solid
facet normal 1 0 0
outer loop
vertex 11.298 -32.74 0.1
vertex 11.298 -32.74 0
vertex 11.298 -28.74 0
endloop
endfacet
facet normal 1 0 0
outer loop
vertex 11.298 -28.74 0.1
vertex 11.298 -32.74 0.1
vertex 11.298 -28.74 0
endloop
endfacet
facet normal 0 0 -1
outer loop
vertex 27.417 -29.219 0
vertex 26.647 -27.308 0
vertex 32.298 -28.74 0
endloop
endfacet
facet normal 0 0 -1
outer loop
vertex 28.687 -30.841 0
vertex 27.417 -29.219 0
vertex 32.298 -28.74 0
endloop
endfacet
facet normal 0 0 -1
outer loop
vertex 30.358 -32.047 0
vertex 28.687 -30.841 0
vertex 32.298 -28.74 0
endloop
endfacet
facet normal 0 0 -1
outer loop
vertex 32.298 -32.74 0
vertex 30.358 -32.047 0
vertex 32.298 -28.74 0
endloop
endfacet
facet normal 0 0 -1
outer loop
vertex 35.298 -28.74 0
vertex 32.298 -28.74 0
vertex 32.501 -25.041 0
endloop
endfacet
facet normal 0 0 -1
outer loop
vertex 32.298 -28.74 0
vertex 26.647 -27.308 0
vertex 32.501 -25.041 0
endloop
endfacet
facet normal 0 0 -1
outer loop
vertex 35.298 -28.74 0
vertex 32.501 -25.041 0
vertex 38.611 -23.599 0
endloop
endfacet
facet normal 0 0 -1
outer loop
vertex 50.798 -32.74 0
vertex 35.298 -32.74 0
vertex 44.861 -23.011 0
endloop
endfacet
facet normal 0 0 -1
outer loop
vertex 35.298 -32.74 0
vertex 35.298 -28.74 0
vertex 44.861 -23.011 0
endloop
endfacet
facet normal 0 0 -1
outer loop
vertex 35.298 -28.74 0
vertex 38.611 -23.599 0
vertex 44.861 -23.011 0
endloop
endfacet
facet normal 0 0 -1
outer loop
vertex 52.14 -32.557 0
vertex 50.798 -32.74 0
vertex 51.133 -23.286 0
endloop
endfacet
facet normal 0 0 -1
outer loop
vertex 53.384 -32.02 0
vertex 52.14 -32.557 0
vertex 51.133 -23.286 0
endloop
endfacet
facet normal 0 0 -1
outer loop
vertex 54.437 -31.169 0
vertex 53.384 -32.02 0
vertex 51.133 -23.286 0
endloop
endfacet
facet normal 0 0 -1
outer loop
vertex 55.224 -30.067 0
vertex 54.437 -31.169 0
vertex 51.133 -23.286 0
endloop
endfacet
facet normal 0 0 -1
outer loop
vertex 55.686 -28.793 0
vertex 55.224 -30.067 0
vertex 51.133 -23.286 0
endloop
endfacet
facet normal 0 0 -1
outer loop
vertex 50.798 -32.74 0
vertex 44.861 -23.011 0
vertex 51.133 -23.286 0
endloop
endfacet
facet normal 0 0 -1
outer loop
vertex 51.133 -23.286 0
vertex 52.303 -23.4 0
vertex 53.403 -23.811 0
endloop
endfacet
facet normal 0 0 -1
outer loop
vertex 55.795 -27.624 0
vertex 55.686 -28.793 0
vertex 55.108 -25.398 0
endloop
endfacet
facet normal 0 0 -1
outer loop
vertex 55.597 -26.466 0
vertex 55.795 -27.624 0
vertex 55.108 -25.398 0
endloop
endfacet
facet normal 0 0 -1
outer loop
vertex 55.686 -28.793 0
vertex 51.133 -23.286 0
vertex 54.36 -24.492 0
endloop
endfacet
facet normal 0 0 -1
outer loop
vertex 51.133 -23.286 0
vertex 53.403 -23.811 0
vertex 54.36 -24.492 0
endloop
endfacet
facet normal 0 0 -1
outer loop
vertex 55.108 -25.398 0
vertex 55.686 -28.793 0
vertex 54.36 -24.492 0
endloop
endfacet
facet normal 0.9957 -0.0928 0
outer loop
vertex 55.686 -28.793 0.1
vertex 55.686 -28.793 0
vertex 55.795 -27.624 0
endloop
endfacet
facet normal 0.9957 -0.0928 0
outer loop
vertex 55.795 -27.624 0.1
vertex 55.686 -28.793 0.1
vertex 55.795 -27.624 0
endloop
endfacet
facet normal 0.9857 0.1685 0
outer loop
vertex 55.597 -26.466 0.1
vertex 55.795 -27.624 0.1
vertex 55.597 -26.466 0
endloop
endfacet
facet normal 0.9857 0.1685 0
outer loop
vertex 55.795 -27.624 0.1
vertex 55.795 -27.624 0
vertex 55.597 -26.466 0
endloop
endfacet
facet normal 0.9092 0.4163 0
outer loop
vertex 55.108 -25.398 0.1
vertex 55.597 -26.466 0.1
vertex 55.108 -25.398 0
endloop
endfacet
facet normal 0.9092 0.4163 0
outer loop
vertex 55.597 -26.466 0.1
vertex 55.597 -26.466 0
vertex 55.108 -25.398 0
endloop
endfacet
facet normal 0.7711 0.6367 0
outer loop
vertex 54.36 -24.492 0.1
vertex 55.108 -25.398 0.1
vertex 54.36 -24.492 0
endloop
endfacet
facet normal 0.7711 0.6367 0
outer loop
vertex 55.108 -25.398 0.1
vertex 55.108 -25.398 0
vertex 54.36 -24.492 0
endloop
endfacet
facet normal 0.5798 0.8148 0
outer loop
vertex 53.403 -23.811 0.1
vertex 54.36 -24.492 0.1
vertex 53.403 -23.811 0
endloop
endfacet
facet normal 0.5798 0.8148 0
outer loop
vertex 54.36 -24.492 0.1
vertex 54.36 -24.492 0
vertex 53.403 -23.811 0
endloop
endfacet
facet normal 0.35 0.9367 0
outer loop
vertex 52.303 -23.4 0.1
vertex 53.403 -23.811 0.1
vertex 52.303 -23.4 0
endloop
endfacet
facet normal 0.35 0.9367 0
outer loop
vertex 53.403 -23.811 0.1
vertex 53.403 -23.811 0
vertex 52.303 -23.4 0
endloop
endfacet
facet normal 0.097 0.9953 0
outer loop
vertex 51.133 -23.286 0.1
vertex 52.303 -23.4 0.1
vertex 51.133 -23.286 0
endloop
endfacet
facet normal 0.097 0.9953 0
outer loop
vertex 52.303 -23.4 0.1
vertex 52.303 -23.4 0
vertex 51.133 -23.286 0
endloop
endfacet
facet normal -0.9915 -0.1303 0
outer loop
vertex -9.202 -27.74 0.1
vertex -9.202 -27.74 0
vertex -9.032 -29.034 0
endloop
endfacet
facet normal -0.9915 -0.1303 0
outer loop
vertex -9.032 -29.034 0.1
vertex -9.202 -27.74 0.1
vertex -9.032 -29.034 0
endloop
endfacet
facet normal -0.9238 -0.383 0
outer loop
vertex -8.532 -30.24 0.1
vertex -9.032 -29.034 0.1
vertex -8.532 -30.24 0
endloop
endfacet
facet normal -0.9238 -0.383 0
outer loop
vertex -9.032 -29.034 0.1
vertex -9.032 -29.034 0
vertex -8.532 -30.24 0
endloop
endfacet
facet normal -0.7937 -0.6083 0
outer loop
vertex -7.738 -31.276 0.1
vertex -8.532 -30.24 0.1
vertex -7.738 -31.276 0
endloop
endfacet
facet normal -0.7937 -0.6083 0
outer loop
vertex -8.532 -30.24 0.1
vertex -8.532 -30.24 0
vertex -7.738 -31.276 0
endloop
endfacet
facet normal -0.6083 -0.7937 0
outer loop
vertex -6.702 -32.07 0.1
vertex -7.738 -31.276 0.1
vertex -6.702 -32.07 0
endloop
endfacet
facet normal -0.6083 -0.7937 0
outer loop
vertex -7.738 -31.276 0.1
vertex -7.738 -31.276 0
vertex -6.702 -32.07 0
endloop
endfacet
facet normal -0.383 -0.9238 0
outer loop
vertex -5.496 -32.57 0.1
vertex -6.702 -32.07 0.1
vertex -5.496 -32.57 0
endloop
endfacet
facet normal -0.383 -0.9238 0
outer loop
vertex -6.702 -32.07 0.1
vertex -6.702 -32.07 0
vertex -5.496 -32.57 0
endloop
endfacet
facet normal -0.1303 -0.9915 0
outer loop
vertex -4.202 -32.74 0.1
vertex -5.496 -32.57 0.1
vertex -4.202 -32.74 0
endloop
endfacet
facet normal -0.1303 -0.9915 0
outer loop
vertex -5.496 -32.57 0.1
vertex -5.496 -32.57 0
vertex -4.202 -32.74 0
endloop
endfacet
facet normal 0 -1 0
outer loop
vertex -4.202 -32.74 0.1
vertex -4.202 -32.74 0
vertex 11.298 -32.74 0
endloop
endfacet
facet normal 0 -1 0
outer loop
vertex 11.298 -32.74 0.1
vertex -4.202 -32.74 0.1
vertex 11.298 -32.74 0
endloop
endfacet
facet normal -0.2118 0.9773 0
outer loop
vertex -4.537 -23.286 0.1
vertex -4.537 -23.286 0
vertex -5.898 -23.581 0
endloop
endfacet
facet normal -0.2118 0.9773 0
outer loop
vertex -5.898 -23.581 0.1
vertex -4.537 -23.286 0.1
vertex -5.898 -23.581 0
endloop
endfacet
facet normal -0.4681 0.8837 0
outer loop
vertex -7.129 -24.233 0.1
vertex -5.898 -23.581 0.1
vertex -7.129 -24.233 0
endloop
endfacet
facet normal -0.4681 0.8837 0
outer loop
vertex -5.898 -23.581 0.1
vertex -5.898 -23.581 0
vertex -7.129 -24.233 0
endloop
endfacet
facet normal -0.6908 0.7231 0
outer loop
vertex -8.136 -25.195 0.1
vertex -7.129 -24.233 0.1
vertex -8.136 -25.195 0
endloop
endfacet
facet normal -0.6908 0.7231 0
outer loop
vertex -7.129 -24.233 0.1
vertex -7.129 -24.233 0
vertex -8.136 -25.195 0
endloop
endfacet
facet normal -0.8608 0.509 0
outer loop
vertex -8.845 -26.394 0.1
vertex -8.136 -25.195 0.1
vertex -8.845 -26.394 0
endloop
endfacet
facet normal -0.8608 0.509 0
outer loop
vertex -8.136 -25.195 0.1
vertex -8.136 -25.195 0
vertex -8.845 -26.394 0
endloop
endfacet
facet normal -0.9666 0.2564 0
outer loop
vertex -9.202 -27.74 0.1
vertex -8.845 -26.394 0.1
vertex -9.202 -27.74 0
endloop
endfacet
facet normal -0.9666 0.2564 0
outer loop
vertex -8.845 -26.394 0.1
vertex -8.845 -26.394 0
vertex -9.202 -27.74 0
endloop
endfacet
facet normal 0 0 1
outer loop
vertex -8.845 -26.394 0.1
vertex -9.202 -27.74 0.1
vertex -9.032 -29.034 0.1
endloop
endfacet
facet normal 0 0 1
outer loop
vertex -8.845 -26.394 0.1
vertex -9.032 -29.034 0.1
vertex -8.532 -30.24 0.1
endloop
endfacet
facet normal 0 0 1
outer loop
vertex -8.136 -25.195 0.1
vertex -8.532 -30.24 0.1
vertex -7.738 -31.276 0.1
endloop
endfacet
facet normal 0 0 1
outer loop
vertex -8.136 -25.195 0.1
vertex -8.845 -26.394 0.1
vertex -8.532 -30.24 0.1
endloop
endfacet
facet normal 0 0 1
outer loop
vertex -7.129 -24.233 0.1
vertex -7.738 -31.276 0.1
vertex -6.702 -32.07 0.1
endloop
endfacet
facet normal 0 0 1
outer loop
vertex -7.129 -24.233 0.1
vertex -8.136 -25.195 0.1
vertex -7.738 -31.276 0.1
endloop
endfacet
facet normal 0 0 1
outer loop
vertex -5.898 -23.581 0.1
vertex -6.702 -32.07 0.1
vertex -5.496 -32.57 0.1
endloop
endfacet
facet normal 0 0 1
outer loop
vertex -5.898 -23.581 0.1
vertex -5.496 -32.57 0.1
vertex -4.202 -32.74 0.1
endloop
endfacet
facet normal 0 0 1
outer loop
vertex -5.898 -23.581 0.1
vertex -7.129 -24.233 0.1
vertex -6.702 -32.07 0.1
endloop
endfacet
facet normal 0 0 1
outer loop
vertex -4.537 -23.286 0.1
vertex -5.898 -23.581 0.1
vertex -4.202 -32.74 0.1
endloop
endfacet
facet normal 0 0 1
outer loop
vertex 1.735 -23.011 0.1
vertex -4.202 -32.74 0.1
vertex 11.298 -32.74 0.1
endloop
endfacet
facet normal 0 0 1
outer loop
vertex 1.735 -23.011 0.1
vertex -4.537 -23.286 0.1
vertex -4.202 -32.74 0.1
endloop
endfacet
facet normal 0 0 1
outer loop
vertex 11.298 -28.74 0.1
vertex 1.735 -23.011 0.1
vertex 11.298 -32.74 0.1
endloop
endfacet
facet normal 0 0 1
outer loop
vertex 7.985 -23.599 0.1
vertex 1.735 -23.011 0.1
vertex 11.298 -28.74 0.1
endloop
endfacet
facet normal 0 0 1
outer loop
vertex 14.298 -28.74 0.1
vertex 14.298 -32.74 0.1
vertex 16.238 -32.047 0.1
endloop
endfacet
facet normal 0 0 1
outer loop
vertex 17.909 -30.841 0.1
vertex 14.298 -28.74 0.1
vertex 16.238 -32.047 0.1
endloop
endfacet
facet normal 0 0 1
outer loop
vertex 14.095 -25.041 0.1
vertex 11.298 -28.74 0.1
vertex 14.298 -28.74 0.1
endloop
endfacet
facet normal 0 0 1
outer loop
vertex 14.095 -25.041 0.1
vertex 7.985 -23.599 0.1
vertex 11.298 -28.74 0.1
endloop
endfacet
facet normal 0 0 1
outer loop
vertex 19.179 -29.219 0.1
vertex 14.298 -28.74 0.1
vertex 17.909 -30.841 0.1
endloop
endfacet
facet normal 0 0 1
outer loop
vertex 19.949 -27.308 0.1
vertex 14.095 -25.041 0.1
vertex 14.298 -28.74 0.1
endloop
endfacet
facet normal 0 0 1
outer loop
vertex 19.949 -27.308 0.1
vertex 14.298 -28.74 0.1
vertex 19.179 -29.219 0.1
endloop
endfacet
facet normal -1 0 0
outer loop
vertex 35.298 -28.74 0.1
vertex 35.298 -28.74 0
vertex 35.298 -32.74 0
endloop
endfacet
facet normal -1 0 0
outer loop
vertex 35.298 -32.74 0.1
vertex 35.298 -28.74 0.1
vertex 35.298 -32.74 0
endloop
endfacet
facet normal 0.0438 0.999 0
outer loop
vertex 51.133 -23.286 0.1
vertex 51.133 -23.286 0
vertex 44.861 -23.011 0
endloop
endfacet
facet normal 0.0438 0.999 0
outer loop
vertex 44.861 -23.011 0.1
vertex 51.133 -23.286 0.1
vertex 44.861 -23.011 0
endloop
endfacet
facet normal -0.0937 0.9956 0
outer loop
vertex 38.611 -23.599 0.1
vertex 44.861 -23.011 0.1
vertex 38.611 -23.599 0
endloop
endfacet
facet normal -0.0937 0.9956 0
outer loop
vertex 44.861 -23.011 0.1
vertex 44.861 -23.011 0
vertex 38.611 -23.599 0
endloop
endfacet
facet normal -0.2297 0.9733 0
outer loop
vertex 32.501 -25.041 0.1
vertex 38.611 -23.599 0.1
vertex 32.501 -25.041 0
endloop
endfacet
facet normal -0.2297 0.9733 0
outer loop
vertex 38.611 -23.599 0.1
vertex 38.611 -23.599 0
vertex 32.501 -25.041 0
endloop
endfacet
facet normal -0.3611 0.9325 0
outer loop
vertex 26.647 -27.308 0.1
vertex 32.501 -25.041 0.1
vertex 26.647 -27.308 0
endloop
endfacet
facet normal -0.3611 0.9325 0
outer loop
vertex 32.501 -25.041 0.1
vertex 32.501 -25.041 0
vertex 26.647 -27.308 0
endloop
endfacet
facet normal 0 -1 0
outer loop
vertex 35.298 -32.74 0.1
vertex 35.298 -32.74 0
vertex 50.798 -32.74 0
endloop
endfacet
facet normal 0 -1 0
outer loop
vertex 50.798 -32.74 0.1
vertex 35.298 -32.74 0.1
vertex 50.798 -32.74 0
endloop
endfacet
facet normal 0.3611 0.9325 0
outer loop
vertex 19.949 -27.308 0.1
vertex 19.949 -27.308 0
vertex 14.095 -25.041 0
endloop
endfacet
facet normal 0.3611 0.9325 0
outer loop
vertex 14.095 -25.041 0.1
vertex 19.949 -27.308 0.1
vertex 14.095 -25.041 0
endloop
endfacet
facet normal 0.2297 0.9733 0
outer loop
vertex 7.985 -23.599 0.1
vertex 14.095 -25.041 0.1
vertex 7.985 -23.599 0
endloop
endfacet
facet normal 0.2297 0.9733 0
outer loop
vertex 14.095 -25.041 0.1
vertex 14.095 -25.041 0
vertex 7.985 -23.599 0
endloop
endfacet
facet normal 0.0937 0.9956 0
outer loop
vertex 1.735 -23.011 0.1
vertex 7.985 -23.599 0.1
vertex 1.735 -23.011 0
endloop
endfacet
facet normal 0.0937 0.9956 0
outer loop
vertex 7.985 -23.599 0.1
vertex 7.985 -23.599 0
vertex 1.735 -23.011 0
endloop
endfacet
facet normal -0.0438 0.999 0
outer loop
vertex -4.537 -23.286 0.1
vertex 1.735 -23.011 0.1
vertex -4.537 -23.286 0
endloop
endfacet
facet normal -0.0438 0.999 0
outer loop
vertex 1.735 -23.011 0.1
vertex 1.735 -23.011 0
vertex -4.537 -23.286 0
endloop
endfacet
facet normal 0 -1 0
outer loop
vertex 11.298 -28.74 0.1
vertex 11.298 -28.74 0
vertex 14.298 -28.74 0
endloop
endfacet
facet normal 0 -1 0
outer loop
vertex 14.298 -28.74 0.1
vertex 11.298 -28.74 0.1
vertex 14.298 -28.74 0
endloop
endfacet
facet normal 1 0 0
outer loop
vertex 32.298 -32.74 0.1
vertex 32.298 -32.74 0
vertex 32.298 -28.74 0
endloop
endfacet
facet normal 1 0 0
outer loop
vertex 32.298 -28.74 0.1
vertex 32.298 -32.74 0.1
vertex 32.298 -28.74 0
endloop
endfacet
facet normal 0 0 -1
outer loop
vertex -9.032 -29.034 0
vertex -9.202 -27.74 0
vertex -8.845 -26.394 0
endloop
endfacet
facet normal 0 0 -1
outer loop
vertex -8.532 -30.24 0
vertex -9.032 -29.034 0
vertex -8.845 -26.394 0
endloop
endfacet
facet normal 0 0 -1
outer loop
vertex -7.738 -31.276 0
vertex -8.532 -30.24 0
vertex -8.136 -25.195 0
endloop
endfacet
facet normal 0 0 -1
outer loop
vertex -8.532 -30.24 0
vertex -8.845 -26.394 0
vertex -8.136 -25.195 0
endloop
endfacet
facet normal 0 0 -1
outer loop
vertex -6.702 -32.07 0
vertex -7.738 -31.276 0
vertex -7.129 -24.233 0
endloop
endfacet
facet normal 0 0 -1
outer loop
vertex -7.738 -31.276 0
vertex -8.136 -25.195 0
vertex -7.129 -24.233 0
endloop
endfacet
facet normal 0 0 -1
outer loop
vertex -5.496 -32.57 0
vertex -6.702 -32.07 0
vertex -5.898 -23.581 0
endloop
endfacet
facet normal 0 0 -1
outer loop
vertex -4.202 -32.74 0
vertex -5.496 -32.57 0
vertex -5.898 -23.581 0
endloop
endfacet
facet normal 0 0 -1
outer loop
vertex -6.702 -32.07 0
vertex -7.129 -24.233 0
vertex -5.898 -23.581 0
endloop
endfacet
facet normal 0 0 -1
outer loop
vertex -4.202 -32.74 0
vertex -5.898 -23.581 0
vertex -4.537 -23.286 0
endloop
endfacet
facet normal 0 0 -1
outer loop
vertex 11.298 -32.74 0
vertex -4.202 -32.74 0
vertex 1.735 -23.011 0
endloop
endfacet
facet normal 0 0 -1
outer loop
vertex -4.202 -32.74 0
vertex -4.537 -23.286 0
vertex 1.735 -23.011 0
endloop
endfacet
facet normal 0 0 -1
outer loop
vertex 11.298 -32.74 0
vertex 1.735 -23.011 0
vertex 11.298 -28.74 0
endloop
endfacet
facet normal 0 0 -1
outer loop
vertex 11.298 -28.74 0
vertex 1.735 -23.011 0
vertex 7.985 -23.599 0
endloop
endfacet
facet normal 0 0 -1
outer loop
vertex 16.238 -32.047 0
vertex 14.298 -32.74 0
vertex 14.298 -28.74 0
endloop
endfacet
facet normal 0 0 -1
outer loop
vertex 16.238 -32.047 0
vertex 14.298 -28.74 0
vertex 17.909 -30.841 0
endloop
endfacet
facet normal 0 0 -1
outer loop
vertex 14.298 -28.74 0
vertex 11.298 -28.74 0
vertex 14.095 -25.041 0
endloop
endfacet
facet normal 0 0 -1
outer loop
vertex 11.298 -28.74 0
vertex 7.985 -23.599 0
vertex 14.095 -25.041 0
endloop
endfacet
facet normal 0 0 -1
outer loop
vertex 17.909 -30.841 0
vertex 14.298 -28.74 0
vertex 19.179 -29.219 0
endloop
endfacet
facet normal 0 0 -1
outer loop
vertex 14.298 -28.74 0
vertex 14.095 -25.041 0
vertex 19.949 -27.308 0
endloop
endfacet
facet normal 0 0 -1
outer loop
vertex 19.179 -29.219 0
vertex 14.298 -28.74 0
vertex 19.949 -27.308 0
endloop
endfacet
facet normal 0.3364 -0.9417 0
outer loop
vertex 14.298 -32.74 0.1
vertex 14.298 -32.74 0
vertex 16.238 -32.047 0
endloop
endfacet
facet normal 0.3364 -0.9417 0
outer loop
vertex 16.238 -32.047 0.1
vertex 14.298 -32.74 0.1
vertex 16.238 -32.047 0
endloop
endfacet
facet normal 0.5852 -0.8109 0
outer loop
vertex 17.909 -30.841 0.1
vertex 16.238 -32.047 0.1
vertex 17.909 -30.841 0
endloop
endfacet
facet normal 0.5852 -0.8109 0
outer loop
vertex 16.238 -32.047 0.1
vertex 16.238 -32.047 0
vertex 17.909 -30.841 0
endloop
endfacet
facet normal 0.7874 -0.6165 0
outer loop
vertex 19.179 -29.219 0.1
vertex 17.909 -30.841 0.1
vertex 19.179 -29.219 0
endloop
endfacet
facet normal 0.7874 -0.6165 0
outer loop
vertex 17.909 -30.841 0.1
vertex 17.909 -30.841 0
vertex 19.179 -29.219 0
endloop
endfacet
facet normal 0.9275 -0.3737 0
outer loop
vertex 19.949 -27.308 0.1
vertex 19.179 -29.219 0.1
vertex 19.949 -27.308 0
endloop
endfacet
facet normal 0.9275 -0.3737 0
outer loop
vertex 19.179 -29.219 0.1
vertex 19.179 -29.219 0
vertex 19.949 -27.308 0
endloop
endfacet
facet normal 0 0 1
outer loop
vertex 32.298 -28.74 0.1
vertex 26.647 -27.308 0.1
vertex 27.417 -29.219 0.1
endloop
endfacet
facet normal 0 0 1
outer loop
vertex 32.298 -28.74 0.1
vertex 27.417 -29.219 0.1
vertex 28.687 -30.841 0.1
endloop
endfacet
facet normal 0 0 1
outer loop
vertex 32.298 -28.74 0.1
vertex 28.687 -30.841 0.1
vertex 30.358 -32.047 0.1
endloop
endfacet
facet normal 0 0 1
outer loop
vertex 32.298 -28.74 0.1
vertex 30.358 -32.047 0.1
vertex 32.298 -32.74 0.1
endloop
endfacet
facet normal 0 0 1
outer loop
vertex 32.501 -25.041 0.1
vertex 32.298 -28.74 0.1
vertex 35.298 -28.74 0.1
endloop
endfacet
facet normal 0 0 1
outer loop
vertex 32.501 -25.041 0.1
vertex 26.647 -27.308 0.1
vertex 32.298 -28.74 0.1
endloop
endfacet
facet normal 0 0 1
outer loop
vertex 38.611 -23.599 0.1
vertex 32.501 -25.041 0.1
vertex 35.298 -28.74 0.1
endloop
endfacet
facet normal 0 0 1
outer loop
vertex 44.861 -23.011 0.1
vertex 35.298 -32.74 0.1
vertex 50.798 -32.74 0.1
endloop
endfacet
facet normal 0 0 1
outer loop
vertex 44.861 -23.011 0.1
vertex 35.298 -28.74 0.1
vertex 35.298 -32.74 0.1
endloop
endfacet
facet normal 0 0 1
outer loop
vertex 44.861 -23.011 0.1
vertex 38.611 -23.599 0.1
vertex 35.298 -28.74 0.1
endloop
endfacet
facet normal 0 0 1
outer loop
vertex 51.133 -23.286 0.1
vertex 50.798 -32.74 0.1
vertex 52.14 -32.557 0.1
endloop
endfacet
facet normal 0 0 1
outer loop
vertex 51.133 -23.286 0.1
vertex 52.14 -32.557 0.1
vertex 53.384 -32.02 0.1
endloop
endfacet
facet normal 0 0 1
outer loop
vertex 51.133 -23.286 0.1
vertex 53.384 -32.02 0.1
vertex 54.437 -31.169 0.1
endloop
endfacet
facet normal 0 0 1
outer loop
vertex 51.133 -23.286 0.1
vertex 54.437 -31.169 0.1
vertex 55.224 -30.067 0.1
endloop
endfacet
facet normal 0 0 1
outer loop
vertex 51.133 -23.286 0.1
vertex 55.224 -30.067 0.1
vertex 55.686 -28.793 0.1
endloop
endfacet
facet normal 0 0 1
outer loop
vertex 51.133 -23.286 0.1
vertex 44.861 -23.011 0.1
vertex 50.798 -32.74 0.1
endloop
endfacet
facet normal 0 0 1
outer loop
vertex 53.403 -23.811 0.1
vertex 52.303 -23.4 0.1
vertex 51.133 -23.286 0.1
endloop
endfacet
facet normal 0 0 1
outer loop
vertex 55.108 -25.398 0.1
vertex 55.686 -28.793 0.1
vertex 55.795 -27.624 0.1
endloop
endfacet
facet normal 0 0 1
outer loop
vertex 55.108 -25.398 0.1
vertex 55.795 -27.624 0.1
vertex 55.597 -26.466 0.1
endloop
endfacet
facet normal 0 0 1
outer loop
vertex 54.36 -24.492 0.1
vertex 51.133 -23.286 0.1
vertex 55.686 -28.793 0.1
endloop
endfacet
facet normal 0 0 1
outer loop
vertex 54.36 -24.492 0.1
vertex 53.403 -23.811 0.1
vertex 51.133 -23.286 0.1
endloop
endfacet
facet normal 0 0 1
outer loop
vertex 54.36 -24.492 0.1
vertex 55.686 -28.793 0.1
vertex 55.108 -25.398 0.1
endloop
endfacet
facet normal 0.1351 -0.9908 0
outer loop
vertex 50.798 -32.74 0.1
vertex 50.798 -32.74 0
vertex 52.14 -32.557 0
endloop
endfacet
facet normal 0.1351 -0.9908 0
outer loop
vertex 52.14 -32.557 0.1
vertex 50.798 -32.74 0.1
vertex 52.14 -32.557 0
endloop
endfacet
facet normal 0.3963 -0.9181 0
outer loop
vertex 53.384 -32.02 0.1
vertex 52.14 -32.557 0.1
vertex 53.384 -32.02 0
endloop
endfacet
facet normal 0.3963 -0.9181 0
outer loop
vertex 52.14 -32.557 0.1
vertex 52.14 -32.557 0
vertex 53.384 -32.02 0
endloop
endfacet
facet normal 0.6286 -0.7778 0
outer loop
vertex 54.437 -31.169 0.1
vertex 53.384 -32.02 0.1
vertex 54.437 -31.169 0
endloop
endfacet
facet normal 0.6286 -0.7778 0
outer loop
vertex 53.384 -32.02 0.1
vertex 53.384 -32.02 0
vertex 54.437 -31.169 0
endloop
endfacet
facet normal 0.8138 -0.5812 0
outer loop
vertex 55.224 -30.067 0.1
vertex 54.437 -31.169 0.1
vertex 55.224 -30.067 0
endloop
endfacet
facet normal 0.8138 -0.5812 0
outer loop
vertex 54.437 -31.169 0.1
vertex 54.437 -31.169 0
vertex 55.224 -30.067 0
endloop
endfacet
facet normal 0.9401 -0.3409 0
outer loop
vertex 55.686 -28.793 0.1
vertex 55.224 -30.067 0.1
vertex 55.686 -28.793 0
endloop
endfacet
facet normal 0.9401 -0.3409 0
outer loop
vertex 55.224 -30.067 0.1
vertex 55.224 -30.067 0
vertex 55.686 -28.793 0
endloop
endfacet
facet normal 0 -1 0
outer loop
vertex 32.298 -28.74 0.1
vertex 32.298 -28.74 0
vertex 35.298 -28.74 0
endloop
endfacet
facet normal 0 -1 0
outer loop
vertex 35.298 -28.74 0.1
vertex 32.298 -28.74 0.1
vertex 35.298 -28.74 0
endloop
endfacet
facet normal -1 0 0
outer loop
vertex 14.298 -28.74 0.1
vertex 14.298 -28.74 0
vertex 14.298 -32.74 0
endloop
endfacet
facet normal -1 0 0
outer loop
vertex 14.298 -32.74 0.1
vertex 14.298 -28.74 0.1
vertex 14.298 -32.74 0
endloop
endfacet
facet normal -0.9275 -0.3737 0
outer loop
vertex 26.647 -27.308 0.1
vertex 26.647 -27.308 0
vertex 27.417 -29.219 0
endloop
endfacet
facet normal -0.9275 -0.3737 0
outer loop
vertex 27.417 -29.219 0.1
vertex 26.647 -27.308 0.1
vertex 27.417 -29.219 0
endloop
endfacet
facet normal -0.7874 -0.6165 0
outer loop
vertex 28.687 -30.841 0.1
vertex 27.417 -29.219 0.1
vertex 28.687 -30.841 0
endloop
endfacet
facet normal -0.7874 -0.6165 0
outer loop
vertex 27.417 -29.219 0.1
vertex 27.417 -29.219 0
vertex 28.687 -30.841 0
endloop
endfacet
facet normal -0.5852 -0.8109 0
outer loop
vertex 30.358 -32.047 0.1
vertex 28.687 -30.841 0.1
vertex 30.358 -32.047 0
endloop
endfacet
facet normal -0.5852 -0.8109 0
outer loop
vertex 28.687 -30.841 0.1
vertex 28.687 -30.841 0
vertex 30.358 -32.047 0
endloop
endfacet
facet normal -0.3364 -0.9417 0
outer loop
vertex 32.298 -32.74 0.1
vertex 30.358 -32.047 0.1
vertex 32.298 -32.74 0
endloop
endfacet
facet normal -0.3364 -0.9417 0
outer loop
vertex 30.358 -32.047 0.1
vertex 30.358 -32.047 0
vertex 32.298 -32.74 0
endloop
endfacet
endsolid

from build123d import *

# Parameters (mm, degrees)
SALIENTE_EXTRUIR1_DEPTH   = 0.1
SALIENTE_EXTRUIR1_2_DEPTH = 0.1


with BuildPart() as part:
    # Model → Saliente-Extruir1 (new body)
    with BuildSketch(Plane.XY):
        with BuildLine():
            Line((14.298081521, -28.740255232), (14.298081521, -32.740255232))
            ThreePointArc((14.298081521, -32.740255232), (17.909033692, -30.841353282), (19.949395844, -27.308404586))
            ThreePointArc((19.949395844, -27.308404586), (7.985017637, -23.599365404), (-4.537175356, -23.286315593))
            ThreePointArc((-4.537175356, -23.286315593), (-7.665621003, -24.679493884), (-9.20203301, -27.740140231))
            ThreePointArc((-9.20203301, -27.740140231), (-7.737607575, -31.275748479), (-4.202033011, -32.740255232))
            Line((-4.202033011, -32.740255232), (11.298081521, -32.740255232))
            Line((11.298081521, -32.740255232), (11.298081521, -28.740255232))
            Line((11.298081521, -28.740255232), (14.298081521, -28.740255232))
        make_face()
    extrude(amount=SALIENTE_EXTRUIR1_DEPTH)


with BuildPart() as body_2:
    # Model → Saliente-Extruir1 2 (new body)
    with BuildSketch(Plane.XY):
        with BuildLine():
            Line((35.298081521, -32.740255232), (50.798196053, -32.740255232))
            ThreePointArc((50.798196053, -32.740255232), (53.939396867, -31.630352589), (55.686026846, -28.79339821))
            ThreePointArc((55.686026846, -28.79339821), (54.763493082, -24.920665912), (51.133338397, -23.286315593))
            ThreePointArc((51.133338397, -23.286315593), (38.611145405, -23.599365404), (26.646767198, -27.308404586))
            ThreePointArc((26.646767198, -27.308404586), (28.68712935, -30.841353282), (32.298081521, -32.740255232))
            Line((32.298081521, -32.740255232), (32.298081521, -28.740255232))
            Line((32.298081521, -28.740255232), (35.298081521, -28.740255232))
            Line((35.298081521, -28.740255232), (35.298081521, -32.740255232))
        make_face()
    extrude(amount=SALIENTE_EXTRUIR1_2_DEPTH)


solid = Compound([part.part, body_2.part])
